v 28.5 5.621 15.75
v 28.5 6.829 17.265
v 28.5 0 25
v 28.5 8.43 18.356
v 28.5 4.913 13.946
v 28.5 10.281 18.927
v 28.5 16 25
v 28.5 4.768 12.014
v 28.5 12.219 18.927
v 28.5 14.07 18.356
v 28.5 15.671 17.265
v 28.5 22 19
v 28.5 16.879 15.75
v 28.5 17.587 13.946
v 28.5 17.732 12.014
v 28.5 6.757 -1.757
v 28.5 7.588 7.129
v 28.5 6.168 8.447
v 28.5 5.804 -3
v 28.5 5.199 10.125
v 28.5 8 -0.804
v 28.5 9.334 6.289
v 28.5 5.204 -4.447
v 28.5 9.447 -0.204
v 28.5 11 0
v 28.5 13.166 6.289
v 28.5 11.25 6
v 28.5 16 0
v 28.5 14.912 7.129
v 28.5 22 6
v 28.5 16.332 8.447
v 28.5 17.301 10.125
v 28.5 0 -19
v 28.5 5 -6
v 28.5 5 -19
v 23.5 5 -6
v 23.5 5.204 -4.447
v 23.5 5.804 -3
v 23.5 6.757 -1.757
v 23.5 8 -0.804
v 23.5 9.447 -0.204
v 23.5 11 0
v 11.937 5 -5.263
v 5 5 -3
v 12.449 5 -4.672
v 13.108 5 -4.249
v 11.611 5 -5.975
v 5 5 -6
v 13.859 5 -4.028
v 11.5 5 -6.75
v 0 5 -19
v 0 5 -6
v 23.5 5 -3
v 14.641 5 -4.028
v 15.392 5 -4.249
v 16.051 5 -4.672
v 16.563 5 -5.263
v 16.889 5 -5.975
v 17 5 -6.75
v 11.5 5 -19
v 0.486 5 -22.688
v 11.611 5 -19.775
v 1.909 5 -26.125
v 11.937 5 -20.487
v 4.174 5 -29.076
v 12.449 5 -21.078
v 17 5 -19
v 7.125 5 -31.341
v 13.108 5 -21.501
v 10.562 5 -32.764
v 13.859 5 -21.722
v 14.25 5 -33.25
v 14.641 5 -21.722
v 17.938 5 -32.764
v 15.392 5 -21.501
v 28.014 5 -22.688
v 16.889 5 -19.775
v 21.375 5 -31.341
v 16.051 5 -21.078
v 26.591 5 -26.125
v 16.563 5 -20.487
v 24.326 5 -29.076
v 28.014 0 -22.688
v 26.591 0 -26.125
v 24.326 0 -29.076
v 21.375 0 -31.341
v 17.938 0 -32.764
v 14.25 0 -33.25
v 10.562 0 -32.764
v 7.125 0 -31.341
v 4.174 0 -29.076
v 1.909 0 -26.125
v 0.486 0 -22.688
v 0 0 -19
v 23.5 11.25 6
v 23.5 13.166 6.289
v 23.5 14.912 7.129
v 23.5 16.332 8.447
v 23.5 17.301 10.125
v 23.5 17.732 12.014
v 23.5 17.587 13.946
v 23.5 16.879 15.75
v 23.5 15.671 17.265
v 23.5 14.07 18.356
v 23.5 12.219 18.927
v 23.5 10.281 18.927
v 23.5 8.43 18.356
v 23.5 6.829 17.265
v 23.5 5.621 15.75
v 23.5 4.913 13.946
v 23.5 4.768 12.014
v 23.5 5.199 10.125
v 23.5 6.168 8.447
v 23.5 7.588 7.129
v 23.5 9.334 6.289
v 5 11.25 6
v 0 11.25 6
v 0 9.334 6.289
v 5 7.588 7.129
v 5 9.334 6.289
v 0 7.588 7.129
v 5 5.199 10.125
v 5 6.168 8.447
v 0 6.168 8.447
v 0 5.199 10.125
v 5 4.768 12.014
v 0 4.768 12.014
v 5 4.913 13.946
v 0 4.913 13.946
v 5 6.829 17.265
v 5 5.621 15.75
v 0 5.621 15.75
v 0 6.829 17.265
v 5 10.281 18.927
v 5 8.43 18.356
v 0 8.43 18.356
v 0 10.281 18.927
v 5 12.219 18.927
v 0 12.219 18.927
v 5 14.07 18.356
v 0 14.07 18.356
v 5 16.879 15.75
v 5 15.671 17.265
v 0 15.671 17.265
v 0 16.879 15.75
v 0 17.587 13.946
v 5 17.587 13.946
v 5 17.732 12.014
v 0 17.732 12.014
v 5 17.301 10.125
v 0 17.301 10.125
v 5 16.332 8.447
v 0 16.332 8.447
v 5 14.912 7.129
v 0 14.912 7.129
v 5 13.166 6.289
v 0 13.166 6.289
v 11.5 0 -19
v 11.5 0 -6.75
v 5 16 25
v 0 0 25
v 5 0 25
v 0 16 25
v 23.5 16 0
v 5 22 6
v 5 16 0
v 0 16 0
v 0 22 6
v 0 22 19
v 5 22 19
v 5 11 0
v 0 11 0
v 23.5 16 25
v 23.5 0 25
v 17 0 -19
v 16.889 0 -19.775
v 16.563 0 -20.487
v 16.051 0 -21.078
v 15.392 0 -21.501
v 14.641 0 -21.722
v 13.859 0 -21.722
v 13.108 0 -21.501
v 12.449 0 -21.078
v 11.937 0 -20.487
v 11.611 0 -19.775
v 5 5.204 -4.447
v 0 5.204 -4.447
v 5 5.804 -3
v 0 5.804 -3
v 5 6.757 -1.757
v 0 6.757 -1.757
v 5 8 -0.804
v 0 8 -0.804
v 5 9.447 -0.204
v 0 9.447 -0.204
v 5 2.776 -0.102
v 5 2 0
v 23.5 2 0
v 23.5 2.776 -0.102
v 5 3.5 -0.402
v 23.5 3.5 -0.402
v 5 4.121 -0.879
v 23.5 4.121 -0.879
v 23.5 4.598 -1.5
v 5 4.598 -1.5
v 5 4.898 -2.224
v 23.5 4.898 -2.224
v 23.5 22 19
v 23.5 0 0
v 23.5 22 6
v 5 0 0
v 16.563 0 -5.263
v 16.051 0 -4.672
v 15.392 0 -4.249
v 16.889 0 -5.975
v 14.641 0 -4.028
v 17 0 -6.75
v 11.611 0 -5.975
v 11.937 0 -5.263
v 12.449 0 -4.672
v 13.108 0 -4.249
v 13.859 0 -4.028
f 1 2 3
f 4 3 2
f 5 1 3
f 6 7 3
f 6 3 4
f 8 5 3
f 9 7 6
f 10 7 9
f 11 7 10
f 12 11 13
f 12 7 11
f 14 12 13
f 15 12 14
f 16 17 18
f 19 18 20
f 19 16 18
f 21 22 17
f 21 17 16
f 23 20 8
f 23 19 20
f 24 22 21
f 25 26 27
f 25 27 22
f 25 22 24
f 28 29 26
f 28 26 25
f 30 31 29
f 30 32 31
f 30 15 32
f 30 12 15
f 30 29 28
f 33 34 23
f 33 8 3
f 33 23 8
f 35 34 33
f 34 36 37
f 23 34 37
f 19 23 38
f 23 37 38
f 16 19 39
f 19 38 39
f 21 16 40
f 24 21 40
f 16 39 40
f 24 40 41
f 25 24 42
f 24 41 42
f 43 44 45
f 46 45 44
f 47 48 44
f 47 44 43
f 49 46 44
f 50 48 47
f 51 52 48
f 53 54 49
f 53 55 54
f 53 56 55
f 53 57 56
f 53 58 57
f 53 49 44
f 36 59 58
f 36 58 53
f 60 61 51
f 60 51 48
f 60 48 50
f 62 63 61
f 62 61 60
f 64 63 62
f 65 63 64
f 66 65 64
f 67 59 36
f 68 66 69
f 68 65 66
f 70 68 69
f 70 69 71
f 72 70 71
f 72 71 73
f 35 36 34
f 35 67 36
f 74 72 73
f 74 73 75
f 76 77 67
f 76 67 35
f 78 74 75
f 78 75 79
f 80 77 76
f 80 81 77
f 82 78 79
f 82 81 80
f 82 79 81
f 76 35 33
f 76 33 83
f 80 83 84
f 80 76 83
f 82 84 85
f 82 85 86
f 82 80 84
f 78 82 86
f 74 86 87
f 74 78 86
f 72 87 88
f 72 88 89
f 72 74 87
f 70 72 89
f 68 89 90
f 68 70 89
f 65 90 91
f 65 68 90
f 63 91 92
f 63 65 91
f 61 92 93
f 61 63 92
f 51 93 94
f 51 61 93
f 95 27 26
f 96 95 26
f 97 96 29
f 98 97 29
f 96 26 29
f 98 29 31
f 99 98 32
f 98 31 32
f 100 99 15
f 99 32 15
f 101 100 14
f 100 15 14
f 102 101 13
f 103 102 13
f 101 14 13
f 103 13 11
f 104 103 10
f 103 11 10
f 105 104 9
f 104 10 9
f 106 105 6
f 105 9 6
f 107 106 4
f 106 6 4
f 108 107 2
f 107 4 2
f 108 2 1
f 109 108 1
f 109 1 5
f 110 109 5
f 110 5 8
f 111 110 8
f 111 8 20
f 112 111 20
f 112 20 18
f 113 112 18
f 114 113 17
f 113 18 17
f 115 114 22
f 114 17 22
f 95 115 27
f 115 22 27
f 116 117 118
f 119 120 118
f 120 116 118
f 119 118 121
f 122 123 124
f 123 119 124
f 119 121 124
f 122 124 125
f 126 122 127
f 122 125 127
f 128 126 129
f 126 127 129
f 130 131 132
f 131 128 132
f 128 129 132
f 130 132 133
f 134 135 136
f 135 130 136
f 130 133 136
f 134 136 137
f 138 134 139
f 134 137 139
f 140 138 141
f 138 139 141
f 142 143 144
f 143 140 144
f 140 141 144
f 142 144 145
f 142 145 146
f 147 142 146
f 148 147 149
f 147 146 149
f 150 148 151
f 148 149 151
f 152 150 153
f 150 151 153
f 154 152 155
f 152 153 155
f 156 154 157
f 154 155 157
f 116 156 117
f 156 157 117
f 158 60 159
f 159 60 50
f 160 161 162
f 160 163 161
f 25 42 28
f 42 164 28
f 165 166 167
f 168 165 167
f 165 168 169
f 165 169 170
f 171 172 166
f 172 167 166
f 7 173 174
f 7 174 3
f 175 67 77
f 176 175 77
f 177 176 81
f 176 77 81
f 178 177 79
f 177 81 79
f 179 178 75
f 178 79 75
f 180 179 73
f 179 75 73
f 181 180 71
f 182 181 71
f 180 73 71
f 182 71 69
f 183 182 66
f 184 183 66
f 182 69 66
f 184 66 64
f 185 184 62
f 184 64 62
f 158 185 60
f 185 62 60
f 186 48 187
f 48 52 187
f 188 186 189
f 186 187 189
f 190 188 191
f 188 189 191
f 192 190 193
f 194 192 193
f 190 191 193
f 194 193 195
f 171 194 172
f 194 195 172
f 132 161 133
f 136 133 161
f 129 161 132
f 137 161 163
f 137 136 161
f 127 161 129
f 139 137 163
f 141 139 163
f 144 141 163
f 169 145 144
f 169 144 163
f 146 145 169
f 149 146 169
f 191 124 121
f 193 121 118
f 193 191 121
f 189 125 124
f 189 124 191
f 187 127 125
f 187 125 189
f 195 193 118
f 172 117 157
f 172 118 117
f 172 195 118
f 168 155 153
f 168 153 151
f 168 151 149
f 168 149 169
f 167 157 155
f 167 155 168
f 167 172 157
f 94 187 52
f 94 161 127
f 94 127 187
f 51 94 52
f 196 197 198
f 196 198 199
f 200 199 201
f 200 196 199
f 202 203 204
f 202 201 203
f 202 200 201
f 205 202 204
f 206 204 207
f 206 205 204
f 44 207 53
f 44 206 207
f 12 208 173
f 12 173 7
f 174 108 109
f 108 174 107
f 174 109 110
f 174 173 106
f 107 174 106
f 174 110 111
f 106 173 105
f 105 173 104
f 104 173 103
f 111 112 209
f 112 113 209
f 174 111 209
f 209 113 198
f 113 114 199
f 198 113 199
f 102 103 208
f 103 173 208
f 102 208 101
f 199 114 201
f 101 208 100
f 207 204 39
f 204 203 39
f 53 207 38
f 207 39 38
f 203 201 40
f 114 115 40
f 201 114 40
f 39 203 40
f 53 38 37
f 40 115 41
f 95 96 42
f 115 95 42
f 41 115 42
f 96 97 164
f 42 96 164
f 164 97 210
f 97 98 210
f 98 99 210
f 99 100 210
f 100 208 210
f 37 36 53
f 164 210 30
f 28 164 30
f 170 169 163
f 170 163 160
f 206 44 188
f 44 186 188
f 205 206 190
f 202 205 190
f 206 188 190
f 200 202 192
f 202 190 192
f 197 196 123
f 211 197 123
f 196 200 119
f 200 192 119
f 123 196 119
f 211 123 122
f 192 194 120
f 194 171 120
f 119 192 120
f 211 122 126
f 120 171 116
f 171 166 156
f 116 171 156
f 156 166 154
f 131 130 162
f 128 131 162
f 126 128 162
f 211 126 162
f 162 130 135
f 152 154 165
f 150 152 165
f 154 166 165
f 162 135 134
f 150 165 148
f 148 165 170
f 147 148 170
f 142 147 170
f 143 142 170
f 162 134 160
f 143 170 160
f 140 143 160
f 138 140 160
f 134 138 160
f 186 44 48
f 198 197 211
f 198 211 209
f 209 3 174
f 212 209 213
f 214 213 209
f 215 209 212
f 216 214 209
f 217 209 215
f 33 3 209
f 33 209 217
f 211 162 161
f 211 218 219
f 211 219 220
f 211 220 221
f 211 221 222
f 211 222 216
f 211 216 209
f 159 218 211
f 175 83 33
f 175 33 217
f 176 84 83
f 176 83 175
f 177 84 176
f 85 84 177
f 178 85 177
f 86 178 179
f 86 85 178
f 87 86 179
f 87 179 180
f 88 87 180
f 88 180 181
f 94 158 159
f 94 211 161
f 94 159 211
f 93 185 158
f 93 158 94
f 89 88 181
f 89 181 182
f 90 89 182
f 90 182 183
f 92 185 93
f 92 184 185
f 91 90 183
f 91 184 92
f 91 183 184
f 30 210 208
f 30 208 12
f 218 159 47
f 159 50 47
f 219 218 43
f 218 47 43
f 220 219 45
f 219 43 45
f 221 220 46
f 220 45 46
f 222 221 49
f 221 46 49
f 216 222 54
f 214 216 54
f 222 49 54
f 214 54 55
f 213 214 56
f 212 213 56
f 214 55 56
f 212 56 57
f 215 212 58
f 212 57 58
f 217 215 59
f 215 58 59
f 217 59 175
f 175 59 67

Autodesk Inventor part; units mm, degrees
ref_plane "YZ Plane" through (0, 0, 0) normal (1, 0, 0) x (0, 1, 0)
ref_plane "XZ Plane" through (0, 0, 0) normal (0, 1, 0) x (-1, 0, 0)
ref_plane "XY Plane" through (0, 0, 0) normal (0, 0, 1) x (1, 0, 0)
sketch "Skizze1" plane through (0, 0, 0) normal (0, 0, 1) x (1, 0, 0)
  line L0 (0, 0) -> (0, 22)
  line L1 (0, 22) -> (5, 22)
  line L2 (5, 22) -> (5, 5)
  line L3 (5, 5) -> (23.5, 5)
  line L4 (23.5, 5) -> (23.5, 22)
  line L5 (23.5, 22) -> (28.5, 22)
  line L6 (28.5, 22) -> (28.5, 0)
  line L7 (28.5, 0) -> (0, 0)
  line L8 (14.25, 5) -> (14.25, 0) construction
  line L9 (0, 11.55) -> (28.5, 11.55) construction
  dimension "d0" = 5
  dimension "d1" = 5
  dimension "d2" = 11.55
  dimension "d3" = 18.5
  dimension "d4" = 22
  dimension "d14" = 28.5
extrude "Extrusion1" add sketch "Skizze1" along normal blind 25
sketch "Skizze2" plane through (28.5, 0, 0) normal (1, 0, 0) x (0, 0, -1)
  circle A0 centre (-12.5, 11.25) radius 5
  line L0 (-12.5, 11.25) -> (-12.5, 22) construction
  line L1 (0, 22) -> (-25, 22) construction
  circle A1 centre (-12.5, 11.25) radius 6.5
  point P0 (0, 0)
  point P1 (-25, 0)
  dimension "d7" = 11.25
  dimension "d8" = 10
  dimension "d20" = 13
extrude "Extrusion2" cut sketch "Skizze2" against normal through all contours A0
sketch "Skizze3" plane through (5, 5, 0) normal (0, 1, 0) x (1, 0, 0)
  line L0 (18.5, -25) -> (0, -25) construction
  line L1 (9.25, -25) -> (9.25, 0) construction
  line L2 (18.5, 0) -> (0, 0) construction
  line L3 (9.25, -44.3) -> (9.25, -5.7) construction
  line L4 (18.5, -44.3) -> (18.5, -5.7)
  line L5 (0, -5.7) -> (0, -44.3)
  arc A0 (0, -44.3) -> (18.5, -44.3) centre (9.25, -44.3) ccw
  arc A1 (18.5, -5.7) -> (0, -5.7) centre (9.25, -5.7) ccw
  line L6 (29.2, -12.5) -> (-10.7, -12.5) construction
  line L7 (8, 0) -> (8, -25) construction
  line L8 (18, 0) -> (18, -25) construction
  line L9 (0, -25) -> (-5, -25) projected
  line L10 (9.25, 0) -> (1.9649, 0)
  line L11 (18.5, 0) -> (0, 0)
  line L12 (-5, 0) -> (23.5, 0) projected
  line L13 (18.5, 0) -> (18.5, -5.7)
  line L14 (0, 0) -> (0, -5.7)
  point P0 (16.5351, 0)
  dimension "d11" = 18.5
  dimension "d25" = 6.8
  dimension "d32" = 0.5
  dimension "d33" = 10
extrude "Extrusion3" cut sketch "Skizze3" against normal through all
sketch "Skizze4" plane through (5, 5, 0) normal (0, 1, 0) x (1, 0, 0)
  line L0 (18.5, 0) -> (0, 0) projected
  line L1 (9.25, -11) -> (9.25, 19) construction
  line L2 (-5, 0) -> (23.5, 0) projected
  line L3 (0, -11) -> (0, 19)
  line L4 (18.5, 19) -> (18.5, -11)
  arc A0 (0, -11) -> (18.5, -11) centre (9.25, -11) ccw
  arc A1 (18.5, 19) -> (0, 19) centre (9.25, 19) ccw
  line L5 (6.5, 19) -> (6.5, -11)
  arc A2 (6.5, -11) -> (12, -11) centre (9.25, -11) ccw
  line L6 (12, -11) -> (12, 19)
  arc A3 (12, 19) -> (6.5, 19) centre (9.25, 19) ccw
  arc A4 (6.5, 6.75) -> (12, 6.75) centre (9.25, 6.75) ccw
  line L7 (23.5, -11) -> (23.5, 19)
  arc A5 (23.5, 19) -> (-5, 19) centre (9.25, 19) ccw
  line L8 (-5, 19) -> (-5, -11)
  arc A6 (-5, -11) -> (23.5, -11) centre (9.25, -11) ccw
  arc A7 (18.5, 0) -> (0, 0) centre (9.25, -11.8084) ccw
  point P0 (9.25, 4)
  point P1 (18.5, 0)
  point P2 (6.5, 0)
  point P3 (12, 0)
  point P4 (8.25, 0)
  point P5 (9.25, 0)
  point P6 (18.5, -5.7)
  point P7 (0, -5.7)
  point P8 (0, -5.7)
  dimension "d15" = 15
  dimension "d18" = 5.5
  dimension "d26" = 4
  dimension "d34" = 5
  dimension "d35" = 15
extrude "Extrusion4" add sketch "Skizze4" against normal up to surface (5 mm away) contours L4 A1 L3 L2 L8 A5 L7 | A7 L6 A3 L5 L3 A1 L4 | L0 L6 A7 | L0 L5 A7 L6 | A7 L5 A4 L6 | L0 A7 L5
extrude "Extrusion5" cut sketch "Skizze2" against normal blind 5
extrude "Extrusion6" cut sketch "Skizze2" along normal blind 5 from surface at -28.5
chamfer "Fase1" distance 6 angle 45 4 edges at (26, 22, 25) (2.5, 22, 25) (2.5, 22, 0) (26, 22, 0)
fillet "Rundung4" radius 6 2 edges at (26, 5, 0) (2.5, 5, 0)
ref_plane "Arbeitsebene2" through (14.25, 0, -19) normal (1, 0, 0) x (0, 0, -1)
fillet "Rundung5" radius 3 1 edges at (14.25, 5, 0)
properties part number "BeltDiscBottomPart"
